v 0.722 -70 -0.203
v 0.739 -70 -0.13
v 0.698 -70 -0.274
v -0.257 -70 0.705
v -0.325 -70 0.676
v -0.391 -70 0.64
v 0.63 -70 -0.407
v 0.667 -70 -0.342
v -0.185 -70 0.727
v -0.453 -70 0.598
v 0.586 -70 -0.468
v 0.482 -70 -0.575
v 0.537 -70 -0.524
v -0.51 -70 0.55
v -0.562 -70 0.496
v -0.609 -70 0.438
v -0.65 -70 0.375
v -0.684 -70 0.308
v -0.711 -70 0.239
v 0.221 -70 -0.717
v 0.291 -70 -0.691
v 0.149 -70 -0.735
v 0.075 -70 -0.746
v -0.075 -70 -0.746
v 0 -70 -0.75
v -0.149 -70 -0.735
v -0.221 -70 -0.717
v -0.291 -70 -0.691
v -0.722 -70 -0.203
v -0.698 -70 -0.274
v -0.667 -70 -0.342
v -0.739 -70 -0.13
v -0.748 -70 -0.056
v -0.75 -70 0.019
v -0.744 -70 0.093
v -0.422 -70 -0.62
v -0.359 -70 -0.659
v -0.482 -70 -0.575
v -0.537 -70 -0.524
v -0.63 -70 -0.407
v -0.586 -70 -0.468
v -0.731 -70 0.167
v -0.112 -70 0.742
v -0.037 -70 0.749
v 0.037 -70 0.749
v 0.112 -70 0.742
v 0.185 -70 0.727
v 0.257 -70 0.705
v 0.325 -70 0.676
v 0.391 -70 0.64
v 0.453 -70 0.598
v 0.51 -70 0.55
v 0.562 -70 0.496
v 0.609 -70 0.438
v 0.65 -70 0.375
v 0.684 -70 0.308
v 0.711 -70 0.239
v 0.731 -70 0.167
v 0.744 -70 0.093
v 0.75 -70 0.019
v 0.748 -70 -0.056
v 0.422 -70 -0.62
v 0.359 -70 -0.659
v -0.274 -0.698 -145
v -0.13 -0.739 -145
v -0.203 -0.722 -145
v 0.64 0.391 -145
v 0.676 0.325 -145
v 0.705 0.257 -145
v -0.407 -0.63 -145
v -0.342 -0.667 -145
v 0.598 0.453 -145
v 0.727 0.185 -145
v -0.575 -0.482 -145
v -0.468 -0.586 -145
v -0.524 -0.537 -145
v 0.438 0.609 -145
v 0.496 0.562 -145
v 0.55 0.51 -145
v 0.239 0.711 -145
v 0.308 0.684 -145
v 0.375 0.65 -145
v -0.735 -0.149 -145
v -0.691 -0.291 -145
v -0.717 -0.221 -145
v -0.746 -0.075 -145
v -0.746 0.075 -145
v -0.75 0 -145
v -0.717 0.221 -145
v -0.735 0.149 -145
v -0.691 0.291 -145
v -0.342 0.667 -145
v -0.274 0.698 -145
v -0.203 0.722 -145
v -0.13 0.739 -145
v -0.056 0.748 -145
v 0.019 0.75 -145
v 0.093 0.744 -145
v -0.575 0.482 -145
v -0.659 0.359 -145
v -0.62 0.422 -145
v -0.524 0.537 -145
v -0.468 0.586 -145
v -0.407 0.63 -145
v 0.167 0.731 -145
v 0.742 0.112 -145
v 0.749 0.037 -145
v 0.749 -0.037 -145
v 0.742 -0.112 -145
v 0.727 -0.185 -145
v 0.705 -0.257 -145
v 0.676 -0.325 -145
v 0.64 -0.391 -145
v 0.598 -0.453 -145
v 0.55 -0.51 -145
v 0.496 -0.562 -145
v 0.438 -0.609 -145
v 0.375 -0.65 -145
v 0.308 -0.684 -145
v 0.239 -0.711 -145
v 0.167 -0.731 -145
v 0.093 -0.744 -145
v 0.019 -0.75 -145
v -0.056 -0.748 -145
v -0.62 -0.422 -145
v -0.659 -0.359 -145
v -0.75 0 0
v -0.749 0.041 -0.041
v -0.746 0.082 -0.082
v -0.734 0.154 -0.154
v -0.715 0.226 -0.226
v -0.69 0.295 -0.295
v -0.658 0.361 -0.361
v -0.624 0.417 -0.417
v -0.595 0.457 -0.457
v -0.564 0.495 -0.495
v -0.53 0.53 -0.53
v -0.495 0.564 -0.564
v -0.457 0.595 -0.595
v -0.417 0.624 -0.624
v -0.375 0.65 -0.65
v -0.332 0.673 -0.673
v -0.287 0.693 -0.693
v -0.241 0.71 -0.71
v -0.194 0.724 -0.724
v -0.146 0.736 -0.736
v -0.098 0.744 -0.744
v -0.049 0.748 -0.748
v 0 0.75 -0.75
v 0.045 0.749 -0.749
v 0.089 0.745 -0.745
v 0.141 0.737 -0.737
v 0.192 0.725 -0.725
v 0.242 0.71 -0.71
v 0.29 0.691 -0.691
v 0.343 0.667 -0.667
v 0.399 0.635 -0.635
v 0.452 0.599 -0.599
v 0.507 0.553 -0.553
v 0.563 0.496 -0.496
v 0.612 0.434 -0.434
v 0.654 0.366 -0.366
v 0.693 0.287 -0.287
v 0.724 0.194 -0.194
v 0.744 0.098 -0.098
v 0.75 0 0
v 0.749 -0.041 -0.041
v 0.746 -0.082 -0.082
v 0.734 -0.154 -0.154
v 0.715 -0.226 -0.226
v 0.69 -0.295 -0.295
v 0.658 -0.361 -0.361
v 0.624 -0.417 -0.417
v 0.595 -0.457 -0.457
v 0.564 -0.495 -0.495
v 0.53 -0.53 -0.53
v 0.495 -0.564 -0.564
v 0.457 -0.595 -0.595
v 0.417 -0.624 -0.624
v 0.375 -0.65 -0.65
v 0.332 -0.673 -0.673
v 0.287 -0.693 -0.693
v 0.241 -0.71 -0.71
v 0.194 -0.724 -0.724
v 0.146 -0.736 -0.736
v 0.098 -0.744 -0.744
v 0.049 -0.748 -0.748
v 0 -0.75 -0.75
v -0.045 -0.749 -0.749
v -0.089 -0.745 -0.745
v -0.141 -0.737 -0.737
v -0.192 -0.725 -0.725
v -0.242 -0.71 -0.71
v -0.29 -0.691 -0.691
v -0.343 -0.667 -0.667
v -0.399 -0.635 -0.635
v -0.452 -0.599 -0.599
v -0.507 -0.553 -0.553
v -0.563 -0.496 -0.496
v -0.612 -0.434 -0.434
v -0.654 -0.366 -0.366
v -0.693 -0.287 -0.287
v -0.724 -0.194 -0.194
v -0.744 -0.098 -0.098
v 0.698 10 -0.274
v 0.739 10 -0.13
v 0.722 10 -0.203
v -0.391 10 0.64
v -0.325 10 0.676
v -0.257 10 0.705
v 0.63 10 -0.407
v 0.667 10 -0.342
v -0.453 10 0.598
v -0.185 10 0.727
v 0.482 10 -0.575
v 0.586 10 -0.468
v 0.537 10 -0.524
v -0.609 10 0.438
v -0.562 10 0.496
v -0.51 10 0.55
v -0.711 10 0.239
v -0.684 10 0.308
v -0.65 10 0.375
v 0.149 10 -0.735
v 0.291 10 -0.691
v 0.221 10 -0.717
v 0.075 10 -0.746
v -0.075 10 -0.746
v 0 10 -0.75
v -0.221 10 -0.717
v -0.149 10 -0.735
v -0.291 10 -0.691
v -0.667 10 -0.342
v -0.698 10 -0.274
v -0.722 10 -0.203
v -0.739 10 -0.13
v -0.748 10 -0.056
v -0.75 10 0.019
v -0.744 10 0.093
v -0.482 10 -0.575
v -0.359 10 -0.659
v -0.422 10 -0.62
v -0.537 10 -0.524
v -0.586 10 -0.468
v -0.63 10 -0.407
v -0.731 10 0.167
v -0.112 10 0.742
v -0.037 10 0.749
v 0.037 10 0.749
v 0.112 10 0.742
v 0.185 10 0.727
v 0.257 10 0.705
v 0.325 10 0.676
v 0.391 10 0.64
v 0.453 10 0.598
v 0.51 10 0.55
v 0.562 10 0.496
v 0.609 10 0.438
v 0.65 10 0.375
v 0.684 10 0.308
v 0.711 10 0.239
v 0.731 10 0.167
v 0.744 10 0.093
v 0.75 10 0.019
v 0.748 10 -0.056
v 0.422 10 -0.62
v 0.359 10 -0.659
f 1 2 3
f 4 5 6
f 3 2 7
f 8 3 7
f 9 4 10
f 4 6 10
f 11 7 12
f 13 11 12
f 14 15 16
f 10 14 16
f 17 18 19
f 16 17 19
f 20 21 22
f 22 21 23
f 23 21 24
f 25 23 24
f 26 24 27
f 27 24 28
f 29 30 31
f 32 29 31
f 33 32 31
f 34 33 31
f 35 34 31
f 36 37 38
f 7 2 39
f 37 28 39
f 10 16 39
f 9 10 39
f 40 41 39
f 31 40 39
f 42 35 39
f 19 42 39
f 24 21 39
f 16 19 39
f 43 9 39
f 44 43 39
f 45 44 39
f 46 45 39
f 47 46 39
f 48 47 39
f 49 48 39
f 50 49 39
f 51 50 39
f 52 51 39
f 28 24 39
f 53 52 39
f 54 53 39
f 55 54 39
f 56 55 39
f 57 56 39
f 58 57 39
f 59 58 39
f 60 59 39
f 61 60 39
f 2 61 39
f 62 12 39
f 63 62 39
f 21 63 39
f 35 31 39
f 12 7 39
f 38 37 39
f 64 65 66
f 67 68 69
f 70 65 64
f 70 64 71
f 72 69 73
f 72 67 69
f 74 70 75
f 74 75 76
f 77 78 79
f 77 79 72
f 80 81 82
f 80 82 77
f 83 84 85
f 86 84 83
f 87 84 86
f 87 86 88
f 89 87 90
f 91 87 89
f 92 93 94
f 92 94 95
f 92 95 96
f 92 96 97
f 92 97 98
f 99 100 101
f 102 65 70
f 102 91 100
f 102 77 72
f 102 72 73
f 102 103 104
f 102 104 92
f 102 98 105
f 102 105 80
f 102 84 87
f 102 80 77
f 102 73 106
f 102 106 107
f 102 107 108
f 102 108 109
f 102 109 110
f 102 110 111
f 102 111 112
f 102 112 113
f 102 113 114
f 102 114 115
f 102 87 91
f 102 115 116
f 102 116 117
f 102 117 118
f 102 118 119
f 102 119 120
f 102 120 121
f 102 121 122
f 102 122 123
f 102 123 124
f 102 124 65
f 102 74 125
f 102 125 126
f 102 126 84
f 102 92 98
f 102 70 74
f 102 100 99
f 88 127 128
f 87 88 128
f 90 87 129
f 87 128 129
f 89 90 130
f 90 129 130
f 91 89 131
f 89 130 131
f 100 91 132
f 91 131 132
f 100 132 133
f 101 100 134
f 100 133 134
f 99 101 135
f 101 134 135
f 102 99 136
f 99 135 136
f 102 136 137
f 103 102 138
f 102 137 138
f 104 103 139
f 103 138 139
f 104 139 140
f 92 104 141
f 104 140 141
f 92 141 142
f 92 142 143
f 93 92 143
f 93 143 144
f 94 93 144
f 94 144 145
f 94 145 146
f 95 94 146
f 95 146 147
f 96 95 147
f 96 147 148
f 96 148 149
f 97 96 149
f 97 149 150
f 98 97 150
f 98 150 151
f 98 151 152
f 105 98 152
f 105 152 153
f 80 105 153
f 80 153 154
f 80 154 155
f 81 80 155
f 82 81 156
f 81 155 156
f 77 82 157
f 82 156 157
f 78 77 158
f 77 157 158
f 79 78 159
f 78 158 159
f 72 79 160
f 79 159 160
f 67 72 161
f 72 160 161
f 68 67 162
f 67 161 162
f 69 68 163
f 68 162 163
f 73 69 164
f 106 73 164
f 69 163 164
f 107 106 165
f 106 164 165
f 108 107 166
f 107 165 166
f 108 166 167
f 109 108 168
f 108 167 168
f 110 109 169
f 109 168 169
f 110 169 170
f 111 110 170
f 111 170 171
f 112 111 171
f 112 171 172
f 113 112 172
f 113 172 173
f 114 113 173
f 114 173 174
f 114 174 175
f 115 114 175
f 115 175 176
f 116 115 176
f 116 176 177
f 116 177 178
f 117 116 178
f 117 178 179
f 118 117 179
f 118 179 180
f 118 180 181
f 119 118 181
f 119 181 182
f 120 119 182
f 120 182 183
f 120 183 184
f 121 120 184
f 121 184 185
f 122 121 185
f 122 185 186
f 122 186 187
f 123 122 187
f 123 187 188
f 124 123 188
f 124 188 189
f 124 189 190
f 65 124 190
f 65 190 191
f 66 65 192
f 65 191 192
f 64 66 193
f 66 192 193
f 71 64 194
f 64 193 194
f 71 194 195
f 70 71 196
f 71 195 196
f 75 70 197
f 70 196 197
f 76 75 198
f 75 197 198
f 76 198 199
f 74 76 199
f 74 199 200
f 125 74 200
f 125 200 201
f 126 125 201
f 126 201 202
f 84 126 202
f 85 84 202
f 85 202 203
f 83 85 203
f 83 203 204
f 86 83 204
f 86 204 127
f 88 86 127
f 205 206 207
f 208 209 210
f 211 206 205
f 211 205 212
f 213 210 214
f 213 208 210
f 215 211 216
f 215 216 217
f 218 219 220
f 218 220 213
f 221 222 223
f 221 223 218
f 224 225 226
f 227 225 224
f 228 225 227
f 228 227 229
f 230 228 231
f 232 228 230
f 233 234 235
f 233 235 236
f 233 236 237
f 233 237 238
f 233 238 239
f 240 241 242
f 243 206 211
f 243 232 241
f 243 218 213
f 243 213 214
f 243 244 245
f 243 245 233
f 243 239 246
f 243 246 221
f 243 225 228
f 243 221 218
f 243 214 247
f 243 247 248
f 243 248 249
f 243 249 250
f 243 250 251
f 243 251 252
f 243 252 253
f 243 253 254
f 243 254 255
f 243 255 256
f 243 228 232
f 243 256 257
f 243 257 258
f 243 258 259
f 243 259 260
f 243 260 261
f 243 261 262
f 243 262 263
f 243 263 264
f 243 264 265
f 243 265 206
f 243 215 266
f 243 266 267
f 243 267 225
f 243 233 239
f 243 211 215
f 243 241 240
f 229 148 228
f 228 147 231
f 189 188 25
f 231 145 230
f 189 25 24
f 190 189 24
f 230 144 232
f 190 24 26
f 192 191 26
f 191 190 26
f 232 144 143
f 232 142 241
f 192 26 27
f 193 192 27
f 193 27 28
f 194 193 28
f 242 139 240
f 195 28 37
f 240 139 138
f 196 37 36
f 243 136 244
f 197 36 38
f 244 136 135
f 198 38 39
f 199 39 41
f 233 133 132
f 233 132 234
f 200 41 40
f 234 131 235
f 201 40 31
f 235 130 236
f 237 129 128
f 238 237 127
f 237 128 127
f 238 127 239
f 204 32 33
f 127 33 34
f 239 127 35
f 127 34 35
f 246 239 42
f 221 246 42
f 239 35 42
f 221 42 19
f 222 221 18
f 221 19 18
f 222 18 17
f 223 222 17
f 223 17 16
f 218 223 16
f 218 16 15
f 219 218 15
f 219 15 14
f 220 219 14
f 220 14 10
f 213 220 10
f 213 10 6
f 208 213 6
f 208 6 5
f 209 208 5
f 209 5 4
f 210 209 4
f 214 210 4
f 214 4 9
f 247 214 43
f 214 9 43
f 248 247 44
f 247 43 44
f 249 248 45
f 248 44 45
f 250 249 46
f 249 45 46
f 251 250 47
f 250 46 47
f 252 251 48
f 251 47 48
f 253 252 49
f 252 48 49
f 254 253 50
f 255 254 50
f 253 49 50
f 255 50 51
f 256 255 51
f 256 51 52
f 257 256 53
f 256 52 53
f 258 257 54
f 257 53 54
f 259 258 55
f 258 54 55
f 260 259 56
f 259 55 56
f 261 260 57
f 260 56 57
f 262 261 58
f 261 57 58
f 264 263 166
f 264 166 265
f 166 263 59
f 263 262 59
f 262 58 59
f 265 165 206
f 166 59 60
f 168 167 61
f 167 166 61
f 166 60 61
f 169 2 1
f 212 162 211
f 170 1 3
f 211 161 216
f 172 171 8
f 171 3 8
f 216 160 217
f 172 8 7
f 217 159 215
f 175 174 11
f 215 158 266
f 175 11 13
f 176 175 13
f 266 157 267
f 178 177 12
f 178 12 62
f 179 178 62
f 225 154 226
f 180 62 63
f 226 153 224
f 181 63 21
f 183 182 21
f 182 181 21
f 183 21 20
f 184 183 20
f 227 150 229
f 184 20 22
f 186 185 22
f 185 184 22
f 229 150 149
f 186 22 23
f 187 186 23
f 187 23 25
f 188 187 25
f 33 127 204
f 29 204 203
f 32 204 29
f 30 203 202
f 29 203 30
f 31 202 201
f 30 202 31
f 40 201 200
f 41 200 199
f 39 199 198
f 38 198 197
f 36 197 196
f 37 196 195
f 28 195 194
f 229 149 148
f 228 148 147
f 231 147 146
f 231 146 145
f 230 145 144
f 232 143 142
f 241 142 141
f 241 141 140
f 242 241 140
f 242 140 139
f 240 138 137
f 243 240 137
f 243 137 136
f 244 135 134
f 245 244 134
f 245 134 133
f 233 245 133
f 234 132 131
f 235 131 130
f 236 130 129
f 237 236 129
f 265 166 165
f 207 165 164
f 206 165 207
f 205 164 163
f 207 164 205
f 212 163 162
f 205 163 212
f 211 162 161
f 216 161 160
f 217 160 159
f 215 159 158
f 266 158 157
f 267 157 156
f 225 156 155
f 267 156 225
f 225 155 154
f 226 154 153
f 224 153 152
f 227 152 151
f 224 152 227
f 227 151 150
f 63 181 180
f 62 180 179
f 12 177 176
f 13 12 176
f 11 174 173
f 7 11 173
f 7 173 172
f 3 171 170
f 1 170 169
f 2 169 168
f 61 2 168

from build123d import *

# Parameters (mm, degrees)
SKETCH_1_R           = 0.75
EXTRUDE_1_DEPTH      = 145
EXTRUDE_2_DEPTH      = 10
EXTRUDE_2_DEPTH_BACK = 70
SKETCH_2_R           = 0.75
MOVE_BODY_1_ANGLE    = 180


with BuildPart() as part:
    # 草图1 → 凸台-拉伸1 (new body)
    with BuildSketch(Plane.XY):
        Circle(SKETCH_1_R)
    extrude(amount=EXTRUDE_1_DEPTH)

    # 草图2 → 凸台-拉伸2 (add, two sides: drawn at the far end of the back side and taken through both)
    with BuildSketch(Plane(origin=(0, 0, 0), x_dir=(1, 0, 0), z_dir=(0, 1, 0)).offset(-EXTRUDE_2_DEPTH_BACK)):
        with Locations(Location((0, 0, 0), (0, 0, 270))):
            Circle(SKETCH_2_R)
    extrude(amount=EXTRUDE_2_DEPTH + EXTRUDE_2_DEPTH_BACK)


with BuildPart() as part_1:
    # Move Body 1: moved
    add(part.part.rotate(Axis((0, 0, 0), (0, 1, 0)), MOVE_BODY_1_ANGLE))


solid = part_1.part
